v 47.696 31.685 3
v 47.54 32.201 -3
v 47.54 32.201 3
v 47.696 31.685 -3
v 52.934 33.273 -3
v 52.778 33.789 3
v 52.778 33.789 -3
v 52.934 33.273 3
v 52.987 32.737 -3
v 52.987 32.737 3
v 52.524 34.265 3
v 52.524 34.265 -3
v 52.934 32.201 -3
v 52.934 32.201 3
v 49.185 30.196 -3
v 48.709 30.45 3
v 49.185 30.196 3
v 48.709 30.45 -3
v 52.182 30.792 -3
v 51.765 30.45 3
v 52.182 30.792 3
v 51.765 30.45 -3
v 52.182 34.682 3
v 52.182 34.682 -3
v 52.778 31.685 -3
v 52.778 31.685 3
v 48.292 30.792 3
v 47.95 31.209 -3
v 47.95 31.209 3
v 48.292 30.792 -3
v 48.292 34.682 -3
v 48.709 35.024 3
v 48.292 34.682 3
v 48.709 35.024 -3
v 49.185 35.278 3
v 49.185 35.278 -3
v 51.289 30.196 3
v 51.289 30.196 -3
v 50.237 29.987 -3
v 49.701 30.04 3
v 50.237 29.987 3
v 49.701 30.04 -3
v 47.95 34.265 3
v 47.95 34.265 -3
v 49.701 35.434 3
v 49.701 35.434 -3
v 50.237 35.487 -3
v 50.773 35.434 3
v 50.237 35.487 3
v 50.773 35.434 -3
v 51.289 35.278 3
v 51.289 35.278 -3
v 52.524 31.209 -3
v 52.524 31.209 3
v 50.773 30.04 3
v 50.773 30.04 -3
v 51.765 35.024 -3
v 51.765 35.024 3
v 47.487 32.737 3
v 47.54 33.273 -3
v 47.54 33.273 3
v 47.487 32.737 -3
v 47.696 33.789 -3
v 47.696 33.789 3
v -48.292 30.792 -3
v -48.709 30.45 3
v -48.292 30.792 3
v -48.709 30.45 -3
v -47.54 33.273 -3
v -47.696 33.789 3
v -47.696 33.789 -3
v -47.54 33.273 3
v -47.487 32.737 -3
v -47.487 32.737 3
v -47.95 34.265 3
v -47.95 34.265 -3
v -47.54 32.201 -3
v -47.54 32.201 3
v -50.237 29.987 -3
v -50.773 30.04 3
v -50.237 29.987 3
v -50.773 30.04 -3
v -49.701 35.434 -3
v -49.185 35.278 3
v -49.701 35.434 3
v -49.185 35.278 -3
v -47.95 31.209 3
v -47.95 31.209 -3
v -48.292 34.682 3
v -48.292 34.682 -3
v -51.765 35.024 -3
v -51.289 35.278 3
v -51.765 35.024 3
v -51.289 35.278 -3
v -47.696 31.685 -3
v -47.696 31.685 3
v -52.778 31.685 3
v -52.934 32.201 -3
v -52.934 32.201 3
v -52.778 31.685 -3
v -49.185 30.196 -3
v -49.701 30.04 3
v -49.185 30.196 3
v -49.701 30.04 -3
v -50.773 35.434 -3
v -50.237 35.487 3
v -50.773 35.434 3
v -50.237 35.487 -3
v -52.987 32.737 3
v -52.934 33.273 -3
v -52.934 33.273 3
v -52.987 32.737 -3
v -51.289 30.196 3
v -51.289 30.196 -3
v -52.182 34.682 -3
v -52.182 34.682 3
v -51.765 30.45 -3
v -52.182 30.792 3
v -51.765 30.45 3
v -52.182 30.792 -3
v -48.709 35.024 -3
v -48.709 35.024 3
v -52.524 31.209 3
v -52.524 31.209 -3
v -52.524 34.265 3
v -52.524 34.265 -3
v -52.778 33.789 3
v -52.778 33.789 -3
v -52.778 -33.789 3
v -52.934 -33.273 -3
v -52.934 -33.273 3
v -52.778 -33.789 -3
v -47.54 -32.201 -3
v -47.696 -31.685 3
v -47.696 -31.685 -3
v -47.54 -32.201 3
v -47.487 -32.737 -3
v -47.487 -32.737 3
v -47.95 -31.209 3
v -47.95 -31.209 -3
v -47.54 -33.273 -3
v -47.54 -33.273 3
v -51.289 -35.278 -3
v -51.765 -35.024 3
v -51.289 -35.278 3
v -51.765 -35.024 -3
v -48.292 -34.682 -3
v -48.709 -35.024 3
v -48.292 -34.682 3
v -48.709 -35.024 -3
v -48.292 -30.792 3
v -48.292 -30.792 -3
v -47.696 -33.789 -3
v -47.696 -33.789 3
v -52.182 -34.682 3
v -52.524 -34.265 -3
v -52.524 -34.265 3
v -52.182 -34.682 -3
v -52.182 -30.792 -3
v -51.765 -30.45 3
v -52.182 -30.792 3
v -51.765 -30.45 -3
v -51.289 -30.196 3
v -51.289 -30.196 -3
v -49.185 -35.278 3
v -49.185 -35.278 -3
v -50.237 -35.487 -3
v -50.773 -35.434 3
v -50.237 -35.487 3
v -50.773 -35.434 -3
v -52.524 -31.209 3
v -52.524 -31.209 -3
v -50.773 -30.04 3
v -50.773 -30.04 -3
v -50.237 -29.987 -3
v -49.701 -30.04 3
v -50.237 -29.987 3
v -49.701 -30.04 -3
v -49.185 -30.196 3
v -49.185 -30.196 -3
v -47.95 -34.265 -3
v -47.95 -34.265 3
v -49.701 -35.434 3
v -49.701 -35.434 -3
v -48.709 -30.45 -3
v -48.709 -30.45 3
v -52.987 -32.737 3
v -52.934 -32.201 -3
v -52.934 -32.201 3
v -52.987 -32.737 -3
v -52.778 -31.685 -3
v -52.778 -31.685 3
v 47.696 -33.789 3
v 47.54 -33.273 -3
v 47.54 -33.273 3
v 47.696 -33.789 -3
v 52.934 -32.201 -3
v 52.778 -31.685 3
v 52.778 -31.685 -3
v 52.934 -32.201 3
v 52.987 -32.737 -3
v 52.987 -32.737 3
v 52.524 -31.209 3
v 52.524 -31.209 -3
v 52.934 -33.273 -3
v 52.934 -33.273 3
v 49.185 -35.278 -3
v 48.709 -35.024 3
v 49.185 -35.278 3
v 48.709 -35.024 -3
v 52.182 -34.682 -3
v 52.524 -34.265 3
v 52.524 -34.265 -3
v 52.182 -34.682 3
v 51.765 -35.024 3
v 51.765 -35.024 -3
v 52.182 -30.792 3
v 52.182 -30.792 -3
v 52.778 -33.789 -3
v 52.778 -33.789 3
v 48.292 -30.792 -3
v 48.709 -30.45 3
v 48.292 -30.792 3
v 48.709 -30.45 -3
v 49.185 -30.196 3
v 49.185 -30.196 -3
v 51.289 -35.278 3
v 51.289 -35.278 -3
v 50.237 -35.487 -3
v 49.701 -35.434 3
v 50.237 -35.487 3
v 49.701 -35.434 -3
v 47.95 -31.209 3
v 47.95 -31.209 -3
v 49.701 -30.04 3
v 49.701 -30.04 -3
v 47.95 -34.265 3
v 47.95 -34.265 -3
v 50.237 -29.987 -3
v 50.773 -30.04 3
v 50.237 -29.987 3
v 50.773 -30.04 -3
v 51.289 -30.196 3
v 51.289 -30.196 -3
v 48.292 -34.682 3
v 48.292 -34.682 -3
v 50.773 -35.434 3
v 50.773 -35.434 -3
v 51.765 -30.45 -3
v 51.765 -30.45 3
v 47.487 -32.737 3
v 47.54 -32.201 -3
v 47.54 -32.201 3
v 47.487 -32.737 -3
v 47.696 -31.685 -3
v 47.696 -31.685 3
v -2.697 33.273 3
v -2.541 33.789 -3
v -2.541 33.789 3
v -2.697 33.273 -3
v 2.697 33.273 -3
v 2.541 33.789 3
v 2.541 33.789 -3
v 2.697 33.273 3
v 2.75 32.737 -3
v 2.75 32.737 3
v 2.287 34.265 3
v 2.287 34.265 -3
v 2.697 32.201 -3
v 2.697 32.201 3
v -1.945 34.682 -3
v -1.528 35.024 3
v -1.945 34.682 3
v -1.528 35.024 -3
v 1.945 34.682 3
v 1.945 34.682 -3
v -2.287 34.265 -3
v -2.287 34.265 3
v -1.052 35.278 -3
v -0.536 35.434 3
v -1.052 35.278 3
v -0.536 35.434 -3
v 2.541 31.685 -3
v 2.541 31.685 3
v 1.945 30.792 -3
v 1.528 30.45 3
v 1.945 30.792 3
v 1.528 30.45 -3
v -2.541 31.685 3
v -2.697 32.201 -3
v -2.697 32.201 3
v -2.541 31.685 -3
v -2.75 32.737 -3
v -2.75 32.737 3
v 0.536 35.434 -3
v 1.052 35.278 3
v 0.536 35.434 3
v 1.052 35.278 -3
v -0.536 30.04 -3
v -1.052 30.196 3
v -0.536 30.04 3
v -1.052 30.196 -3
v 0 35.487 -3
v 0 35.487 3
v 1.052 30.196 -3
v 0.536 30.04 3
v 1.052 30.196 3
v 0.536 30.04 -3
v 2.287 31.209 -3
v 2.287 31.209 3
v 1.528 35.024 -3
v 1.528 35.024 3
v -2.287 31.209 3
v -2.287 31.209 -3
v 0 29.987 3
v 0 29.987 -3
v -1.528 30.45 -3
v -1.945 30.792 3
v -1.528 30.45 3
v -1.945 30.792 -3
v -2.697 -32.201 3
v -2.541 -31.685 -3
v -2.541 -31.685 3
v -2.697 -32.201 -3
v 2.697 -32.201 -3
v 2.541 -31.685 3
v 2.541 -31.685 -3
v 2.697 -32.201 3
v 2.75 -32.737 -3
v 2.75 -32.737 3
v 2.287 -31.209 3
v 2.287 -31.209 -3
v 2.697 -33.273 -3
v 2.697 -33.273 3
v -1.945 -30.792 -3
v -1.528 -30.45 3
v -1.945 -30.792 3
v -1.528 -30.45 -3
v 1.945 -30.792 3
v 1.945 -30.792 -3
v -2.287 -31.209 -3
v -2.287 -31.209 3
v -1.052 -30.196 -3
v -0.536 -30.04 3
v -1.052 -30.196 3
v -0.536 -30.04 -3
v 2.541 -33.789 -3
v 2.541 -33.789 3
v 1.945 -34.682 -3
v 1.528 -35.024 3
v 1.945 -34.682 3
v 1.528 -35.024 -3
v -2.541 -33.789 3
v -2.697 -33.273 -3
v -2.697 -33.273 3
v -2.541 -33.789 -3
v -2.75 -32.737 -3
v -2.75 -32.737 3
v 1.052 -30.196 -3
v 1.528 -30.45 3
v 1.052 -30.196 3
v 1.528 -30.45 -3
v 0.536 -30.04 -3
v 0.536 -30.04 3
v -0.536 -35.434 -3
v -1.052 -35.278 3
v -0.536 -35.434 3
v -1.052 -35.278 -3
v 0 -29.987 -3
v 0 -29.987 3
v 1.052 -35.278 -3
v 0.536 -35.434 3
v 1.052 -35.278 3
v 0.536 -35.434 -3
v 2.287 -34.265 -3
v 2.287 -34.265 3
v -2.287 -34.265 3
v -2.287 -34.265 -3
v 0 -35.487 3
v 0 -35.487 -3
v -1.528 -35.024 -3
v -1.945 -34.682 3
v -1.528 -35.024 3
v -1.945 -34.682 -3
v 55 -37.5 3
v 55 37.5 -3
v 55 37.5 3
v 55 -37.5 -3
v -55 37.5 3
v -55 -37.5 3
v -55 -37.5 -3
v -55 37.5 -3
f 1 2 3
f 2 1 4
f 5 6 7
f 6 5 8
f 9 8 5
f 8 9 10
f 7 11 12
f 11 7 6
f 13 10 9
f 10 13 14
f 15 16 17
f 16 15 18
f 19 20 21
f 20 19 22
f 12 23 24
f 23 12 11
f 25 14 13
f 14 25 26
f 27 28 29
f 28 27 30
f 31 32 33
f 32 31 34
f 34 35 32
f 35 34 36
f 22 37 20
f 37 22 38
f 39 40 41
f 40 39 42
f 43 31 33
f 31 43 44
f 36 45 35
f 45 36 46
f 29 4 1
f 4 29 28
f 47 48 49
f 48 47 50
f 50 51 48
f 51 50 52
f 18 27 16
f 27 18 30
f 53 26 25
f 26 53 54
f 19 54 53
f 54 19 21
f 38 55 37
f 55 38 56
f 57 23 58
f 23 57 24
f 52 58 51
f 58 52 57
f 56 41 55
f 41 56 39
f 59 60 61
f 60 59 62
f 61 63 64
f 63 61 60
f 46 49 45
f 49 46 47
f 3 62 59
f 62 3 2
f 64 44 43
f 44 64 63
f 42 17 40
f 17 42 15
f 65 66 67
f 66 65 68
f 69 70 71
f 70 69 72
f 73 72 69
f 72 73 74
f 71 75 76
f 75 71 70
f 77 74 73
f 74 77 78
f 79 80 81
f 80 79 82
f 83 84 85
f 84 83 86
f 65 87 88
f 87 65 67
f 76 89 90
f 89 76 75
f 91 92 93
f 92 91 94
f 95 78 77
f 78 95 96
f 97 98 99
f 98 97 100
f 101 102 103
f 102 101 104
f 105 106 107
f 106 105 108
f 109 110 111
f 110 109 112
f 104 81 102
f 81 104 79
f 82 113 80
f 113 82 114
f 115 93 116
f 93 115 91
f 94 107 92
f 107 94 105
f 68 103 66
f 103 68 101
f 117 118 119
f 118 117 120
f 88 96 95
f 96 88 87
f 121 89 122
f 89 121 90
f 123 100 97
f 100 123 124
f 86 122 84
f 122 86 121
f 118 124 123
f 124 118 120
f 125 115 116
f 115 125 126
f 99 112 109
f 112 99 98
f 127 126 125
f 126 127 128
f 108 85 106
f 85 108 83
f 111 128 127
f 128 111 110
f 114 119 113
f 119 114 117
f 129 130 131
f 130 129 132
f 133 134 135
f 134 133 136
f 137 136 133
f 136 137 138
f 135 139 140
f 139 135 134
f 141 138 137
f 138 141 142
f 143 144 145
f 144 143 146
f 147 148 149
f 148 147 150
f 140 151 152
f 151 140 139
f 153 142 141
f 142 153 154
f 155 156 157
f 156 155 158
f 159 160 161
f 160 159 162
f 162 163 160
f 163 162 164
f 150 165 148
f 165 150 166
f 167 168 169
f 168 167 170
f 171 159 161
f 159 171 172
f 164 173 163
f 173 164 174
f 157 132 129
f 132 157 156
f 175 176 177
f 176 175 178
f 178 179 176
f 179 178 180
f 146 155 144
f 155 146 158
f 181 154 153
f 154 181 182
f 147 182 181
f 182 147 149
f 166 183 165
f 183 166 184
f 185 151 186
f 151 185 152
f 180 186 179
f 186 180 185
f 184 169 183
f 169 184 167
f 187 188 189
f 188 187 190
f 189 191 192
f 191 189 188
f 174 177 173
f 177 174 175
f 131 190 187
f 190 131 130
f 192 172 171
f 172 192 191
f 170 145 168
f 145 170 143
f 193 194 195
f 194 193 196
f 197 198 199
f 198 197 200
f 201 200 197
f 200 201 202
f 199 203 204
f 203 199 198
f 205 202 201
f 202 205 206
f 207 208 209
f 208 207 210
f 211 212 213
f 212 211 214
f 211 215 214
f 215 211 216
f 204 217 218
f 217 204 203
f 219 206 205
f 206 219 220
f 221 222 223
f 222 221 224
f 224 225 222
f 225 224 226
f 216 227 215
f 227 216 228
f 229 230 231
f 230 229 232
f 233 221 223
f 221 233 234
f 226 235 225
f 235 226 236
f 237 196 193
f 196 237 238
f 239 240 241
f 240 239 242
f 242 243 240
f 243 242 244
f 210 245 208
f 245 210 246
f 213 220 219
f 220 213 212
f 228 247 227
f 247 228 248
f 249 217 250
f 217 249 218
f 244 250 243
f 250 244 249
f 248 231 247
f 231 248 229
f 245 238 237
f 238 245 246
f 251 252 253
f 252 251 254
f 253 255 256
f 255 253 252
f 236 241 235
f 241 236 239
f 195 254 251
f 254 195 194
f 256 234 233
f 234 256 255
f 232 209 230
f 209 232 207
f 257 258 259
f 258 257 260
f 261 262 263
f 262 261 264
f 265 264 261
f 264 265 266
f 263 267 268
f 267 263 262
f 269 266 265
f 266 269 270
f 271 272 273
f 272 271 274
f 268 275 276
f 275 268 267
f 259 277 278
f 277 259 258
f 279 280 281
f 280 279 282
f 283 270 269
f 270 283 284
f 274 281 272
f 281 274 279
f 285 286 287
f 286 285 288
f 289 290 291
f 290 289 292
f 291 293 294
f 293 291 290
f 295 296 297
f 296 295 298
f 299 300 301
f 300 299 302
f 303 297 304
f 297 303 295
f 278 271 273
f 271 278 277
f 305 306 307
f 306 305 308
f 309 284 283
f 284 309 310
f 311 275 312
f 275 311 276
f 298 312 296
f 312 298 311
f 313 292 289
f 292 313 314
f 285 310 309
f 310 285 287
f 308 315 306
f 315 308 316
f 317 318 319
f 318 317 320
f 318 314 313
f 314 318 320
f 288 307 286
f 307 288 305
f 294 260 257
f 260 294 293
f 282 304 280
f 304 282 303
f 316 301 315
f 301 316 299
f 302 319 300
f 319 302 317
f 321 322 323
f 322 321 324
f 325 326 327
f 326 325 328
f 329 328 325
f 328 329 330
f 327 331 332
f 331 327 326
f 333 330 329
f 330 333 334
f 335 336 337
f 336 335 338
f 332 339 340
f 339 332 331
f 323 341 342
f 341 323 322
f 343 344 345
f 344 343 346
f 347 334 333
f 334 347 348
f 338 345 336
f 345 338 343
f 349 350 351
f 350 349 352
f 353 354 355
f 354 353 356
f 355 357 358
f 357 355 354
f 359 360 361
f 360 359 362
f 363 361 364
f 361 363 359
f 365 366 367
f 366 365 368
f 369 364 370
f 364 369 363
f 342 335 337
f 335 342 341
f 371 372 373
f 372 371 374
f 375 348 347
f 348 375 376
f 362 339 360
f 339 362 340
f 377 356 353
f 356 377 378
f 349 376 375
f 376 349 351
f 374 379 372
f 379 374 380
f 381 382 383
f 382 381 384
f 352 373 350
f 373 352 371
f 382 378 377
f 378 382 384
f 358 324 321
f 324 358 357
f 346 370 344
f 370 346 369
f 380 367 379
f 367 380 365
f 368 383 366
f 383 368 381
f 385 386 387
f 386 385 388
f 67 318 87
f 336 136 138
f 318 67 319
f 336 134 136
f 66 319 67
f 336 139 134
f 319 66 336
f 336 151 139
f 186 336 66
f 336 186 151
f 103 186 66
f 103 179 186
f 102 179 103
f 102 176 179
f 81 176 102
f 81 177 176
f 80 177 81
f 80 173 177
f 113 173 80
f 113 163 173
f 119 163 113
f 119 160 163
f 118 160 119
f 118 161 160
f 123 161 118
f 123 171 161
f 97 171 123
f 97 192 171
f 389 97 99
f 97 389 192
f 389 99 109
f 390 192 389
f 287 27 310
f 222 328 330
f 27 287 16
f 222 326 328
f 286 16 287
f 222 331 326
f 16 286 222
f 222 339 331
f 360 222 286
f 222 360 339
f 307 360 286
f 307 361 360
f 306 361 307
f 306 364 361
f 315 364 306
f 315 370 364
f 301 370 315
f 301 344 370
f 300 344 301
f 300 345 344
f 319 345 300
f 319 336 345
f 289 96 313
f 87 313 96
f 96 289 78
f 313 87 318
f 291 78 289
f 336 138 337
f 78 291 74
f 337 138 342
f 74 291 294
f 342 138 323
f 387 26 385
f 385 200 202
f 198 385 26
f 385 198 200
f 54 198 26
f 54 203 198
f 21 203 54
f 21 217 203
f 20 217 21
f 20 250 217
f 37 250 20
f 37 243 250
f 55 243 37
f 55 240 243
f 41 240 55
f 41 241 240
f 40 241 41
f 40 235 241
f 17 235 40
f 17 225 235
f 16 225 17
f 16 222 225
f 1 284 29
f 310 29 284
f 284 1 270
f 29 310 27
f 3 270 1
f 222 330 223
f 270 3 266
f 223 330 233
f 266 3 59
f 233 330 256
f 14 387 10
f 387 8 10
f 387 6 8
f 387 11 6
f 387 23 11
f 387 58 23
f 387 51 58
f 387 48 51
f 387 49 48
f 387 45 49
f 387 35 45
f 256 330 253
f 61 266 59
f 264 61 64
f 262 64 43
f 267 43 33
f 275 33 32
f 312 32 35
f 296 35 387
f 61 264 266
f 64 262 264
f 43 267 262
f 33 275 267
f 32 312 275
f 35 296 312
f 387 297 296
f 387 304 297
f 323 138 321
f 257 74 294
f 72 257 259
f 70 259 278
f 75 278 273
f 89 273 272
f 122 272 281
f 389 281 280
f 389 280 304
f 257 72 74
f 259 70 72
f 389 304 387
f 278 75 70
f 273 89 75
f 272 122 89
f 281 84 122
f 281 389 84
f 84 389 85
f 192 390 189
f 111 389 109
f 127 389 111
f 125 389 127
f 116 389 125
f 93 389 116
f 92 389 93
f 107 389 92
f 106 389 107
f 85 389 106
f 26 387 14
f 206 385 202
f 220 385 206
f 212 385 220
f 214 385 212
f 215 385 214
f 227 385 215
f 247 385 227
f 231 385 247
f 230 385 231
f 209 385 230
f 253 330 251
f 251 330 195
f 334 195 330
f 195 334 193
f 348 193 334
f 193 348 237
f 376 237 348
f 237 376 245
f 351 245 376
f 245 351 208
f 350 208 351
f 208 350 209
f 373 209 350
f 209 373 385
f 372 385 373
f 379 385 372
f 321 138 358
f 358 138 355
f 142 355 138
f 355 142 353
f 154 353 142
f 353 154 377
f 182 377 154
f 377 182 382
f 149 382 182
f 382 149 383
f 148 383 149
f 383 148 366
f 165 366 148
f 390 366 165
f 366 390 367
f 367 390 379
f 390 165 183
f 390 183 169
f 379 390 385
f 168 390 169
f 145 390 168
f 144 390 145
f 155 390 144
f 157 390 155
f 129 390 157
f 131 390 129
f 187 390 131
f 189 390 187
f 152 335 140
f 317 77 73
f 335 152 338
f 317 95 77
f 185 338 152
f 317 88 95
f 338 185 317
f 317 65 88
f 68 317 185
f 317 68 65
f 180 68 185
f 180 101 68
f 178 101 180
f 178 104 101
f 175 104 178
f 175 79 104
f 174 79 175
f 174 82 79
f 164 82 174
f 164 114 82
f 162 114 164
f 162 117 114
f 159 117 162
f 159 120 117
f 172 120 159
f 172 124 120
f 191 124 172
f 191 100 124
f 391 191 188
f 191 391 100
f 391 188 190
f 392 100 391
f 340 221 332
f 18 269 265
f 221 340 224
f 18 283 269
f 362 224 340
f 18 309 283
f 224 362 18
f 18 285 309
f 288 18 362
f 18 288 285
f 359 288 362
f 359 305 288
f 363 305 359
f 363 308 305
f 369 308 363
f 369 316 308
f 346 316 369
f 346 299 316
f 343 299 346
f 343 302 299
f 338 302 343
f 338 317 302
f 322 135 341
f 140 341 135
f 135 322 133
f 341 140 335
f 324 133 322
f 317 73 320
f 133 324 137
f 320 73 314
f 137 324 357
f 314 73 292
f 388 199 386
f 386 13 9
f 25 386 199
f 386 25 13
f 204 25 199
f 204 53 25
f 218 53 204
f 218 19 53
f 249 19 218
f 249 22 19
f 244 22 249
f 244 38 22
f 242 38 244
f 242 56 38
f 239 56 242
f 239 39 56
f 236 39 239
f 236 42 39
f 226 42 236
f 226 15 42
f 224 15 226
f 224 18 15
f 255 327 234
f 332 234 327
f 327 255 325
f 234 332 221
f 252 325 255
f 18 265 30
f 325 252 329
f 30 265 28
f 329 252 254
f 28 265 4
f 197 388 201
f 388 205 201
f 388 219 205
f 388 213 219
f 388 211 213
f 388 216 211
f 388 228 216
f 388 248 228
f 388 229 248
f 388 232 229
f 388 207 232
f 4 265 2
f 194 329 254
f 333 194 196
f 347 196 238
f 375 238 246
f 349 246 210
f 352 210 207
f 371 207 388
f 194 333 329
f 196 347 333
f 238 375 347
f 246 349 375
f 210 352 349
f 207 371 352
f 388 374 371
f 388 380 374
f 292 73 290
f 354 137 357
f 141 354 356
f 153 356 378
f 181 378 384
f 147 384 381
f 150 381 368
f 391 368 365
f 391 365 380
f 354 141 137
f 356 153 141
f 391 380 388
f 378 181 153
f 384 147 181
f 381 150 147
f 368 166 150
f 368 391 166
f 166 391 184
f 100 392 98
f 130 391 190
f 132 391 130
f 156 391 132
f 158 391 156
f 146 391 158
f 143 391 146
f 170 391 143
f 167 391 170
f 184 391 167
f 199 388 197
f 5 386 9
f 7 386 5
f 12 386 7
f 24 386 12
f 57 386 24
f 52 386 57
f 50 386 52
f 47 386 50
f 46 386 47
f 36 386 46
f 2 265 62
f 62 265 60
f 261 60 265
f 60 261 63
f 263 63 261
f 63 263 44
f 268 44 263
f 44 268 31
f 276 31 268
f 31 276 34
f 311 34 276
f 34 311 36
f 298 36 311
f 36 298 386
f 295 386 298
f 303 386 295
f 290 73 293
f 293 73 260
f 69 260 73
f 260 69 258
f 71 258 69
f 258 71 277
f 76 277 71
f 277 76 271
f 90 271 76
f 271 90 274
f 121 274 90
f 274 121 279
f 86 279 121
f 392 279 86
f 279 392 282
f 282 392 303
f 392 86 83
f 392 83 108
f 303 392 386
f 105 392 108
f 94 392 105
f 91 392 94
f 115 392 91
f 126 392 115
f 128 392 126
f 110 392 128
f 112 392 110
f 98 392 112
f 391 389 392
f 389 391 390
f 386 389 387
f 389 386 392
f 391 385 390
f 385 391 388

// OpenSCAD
$fn = 32;

// ----------------------------------------------------------------------
// Corner plate 110 x 75 x 6
// 6 holes, centres taken from the edge offset
// ----------------------------------------------------------------------

// --- parameters (mm) ---
plate = [110, 75, 6];  // overall size (x, y, z)
holes = 6;             // number of holes the drawing asks for
hole_d = 5.5;          // hole diameter
edge = 4.763;          // hole centre offset from the plate edge

// --- derived feature positions (mm) ---
corner_x = plate[0] / 2 - edge;  // = 50.24   corner hole X
corner_y = plate[1] / 2 - edge;  // = 32.74   corner hole Y
feature_centers = [
  [corner_x, corner_y],
  [-corner_x, corner_y],
  [-corner_x, -corner_y],
  [corner_x, -corner_y],
  [0, corner_y],
  [0, -corner_y]
];   // hole centres the loop below drills

// plate outline, every hole drilled through with the same cutters
difference() {
  cube(plate, center = true);
  for (centre = feature_centers)
    translate([centre[0], centre[1], 0])
      cylinder(d = hole_d, h = plate[2] + 2, center = true);
}
